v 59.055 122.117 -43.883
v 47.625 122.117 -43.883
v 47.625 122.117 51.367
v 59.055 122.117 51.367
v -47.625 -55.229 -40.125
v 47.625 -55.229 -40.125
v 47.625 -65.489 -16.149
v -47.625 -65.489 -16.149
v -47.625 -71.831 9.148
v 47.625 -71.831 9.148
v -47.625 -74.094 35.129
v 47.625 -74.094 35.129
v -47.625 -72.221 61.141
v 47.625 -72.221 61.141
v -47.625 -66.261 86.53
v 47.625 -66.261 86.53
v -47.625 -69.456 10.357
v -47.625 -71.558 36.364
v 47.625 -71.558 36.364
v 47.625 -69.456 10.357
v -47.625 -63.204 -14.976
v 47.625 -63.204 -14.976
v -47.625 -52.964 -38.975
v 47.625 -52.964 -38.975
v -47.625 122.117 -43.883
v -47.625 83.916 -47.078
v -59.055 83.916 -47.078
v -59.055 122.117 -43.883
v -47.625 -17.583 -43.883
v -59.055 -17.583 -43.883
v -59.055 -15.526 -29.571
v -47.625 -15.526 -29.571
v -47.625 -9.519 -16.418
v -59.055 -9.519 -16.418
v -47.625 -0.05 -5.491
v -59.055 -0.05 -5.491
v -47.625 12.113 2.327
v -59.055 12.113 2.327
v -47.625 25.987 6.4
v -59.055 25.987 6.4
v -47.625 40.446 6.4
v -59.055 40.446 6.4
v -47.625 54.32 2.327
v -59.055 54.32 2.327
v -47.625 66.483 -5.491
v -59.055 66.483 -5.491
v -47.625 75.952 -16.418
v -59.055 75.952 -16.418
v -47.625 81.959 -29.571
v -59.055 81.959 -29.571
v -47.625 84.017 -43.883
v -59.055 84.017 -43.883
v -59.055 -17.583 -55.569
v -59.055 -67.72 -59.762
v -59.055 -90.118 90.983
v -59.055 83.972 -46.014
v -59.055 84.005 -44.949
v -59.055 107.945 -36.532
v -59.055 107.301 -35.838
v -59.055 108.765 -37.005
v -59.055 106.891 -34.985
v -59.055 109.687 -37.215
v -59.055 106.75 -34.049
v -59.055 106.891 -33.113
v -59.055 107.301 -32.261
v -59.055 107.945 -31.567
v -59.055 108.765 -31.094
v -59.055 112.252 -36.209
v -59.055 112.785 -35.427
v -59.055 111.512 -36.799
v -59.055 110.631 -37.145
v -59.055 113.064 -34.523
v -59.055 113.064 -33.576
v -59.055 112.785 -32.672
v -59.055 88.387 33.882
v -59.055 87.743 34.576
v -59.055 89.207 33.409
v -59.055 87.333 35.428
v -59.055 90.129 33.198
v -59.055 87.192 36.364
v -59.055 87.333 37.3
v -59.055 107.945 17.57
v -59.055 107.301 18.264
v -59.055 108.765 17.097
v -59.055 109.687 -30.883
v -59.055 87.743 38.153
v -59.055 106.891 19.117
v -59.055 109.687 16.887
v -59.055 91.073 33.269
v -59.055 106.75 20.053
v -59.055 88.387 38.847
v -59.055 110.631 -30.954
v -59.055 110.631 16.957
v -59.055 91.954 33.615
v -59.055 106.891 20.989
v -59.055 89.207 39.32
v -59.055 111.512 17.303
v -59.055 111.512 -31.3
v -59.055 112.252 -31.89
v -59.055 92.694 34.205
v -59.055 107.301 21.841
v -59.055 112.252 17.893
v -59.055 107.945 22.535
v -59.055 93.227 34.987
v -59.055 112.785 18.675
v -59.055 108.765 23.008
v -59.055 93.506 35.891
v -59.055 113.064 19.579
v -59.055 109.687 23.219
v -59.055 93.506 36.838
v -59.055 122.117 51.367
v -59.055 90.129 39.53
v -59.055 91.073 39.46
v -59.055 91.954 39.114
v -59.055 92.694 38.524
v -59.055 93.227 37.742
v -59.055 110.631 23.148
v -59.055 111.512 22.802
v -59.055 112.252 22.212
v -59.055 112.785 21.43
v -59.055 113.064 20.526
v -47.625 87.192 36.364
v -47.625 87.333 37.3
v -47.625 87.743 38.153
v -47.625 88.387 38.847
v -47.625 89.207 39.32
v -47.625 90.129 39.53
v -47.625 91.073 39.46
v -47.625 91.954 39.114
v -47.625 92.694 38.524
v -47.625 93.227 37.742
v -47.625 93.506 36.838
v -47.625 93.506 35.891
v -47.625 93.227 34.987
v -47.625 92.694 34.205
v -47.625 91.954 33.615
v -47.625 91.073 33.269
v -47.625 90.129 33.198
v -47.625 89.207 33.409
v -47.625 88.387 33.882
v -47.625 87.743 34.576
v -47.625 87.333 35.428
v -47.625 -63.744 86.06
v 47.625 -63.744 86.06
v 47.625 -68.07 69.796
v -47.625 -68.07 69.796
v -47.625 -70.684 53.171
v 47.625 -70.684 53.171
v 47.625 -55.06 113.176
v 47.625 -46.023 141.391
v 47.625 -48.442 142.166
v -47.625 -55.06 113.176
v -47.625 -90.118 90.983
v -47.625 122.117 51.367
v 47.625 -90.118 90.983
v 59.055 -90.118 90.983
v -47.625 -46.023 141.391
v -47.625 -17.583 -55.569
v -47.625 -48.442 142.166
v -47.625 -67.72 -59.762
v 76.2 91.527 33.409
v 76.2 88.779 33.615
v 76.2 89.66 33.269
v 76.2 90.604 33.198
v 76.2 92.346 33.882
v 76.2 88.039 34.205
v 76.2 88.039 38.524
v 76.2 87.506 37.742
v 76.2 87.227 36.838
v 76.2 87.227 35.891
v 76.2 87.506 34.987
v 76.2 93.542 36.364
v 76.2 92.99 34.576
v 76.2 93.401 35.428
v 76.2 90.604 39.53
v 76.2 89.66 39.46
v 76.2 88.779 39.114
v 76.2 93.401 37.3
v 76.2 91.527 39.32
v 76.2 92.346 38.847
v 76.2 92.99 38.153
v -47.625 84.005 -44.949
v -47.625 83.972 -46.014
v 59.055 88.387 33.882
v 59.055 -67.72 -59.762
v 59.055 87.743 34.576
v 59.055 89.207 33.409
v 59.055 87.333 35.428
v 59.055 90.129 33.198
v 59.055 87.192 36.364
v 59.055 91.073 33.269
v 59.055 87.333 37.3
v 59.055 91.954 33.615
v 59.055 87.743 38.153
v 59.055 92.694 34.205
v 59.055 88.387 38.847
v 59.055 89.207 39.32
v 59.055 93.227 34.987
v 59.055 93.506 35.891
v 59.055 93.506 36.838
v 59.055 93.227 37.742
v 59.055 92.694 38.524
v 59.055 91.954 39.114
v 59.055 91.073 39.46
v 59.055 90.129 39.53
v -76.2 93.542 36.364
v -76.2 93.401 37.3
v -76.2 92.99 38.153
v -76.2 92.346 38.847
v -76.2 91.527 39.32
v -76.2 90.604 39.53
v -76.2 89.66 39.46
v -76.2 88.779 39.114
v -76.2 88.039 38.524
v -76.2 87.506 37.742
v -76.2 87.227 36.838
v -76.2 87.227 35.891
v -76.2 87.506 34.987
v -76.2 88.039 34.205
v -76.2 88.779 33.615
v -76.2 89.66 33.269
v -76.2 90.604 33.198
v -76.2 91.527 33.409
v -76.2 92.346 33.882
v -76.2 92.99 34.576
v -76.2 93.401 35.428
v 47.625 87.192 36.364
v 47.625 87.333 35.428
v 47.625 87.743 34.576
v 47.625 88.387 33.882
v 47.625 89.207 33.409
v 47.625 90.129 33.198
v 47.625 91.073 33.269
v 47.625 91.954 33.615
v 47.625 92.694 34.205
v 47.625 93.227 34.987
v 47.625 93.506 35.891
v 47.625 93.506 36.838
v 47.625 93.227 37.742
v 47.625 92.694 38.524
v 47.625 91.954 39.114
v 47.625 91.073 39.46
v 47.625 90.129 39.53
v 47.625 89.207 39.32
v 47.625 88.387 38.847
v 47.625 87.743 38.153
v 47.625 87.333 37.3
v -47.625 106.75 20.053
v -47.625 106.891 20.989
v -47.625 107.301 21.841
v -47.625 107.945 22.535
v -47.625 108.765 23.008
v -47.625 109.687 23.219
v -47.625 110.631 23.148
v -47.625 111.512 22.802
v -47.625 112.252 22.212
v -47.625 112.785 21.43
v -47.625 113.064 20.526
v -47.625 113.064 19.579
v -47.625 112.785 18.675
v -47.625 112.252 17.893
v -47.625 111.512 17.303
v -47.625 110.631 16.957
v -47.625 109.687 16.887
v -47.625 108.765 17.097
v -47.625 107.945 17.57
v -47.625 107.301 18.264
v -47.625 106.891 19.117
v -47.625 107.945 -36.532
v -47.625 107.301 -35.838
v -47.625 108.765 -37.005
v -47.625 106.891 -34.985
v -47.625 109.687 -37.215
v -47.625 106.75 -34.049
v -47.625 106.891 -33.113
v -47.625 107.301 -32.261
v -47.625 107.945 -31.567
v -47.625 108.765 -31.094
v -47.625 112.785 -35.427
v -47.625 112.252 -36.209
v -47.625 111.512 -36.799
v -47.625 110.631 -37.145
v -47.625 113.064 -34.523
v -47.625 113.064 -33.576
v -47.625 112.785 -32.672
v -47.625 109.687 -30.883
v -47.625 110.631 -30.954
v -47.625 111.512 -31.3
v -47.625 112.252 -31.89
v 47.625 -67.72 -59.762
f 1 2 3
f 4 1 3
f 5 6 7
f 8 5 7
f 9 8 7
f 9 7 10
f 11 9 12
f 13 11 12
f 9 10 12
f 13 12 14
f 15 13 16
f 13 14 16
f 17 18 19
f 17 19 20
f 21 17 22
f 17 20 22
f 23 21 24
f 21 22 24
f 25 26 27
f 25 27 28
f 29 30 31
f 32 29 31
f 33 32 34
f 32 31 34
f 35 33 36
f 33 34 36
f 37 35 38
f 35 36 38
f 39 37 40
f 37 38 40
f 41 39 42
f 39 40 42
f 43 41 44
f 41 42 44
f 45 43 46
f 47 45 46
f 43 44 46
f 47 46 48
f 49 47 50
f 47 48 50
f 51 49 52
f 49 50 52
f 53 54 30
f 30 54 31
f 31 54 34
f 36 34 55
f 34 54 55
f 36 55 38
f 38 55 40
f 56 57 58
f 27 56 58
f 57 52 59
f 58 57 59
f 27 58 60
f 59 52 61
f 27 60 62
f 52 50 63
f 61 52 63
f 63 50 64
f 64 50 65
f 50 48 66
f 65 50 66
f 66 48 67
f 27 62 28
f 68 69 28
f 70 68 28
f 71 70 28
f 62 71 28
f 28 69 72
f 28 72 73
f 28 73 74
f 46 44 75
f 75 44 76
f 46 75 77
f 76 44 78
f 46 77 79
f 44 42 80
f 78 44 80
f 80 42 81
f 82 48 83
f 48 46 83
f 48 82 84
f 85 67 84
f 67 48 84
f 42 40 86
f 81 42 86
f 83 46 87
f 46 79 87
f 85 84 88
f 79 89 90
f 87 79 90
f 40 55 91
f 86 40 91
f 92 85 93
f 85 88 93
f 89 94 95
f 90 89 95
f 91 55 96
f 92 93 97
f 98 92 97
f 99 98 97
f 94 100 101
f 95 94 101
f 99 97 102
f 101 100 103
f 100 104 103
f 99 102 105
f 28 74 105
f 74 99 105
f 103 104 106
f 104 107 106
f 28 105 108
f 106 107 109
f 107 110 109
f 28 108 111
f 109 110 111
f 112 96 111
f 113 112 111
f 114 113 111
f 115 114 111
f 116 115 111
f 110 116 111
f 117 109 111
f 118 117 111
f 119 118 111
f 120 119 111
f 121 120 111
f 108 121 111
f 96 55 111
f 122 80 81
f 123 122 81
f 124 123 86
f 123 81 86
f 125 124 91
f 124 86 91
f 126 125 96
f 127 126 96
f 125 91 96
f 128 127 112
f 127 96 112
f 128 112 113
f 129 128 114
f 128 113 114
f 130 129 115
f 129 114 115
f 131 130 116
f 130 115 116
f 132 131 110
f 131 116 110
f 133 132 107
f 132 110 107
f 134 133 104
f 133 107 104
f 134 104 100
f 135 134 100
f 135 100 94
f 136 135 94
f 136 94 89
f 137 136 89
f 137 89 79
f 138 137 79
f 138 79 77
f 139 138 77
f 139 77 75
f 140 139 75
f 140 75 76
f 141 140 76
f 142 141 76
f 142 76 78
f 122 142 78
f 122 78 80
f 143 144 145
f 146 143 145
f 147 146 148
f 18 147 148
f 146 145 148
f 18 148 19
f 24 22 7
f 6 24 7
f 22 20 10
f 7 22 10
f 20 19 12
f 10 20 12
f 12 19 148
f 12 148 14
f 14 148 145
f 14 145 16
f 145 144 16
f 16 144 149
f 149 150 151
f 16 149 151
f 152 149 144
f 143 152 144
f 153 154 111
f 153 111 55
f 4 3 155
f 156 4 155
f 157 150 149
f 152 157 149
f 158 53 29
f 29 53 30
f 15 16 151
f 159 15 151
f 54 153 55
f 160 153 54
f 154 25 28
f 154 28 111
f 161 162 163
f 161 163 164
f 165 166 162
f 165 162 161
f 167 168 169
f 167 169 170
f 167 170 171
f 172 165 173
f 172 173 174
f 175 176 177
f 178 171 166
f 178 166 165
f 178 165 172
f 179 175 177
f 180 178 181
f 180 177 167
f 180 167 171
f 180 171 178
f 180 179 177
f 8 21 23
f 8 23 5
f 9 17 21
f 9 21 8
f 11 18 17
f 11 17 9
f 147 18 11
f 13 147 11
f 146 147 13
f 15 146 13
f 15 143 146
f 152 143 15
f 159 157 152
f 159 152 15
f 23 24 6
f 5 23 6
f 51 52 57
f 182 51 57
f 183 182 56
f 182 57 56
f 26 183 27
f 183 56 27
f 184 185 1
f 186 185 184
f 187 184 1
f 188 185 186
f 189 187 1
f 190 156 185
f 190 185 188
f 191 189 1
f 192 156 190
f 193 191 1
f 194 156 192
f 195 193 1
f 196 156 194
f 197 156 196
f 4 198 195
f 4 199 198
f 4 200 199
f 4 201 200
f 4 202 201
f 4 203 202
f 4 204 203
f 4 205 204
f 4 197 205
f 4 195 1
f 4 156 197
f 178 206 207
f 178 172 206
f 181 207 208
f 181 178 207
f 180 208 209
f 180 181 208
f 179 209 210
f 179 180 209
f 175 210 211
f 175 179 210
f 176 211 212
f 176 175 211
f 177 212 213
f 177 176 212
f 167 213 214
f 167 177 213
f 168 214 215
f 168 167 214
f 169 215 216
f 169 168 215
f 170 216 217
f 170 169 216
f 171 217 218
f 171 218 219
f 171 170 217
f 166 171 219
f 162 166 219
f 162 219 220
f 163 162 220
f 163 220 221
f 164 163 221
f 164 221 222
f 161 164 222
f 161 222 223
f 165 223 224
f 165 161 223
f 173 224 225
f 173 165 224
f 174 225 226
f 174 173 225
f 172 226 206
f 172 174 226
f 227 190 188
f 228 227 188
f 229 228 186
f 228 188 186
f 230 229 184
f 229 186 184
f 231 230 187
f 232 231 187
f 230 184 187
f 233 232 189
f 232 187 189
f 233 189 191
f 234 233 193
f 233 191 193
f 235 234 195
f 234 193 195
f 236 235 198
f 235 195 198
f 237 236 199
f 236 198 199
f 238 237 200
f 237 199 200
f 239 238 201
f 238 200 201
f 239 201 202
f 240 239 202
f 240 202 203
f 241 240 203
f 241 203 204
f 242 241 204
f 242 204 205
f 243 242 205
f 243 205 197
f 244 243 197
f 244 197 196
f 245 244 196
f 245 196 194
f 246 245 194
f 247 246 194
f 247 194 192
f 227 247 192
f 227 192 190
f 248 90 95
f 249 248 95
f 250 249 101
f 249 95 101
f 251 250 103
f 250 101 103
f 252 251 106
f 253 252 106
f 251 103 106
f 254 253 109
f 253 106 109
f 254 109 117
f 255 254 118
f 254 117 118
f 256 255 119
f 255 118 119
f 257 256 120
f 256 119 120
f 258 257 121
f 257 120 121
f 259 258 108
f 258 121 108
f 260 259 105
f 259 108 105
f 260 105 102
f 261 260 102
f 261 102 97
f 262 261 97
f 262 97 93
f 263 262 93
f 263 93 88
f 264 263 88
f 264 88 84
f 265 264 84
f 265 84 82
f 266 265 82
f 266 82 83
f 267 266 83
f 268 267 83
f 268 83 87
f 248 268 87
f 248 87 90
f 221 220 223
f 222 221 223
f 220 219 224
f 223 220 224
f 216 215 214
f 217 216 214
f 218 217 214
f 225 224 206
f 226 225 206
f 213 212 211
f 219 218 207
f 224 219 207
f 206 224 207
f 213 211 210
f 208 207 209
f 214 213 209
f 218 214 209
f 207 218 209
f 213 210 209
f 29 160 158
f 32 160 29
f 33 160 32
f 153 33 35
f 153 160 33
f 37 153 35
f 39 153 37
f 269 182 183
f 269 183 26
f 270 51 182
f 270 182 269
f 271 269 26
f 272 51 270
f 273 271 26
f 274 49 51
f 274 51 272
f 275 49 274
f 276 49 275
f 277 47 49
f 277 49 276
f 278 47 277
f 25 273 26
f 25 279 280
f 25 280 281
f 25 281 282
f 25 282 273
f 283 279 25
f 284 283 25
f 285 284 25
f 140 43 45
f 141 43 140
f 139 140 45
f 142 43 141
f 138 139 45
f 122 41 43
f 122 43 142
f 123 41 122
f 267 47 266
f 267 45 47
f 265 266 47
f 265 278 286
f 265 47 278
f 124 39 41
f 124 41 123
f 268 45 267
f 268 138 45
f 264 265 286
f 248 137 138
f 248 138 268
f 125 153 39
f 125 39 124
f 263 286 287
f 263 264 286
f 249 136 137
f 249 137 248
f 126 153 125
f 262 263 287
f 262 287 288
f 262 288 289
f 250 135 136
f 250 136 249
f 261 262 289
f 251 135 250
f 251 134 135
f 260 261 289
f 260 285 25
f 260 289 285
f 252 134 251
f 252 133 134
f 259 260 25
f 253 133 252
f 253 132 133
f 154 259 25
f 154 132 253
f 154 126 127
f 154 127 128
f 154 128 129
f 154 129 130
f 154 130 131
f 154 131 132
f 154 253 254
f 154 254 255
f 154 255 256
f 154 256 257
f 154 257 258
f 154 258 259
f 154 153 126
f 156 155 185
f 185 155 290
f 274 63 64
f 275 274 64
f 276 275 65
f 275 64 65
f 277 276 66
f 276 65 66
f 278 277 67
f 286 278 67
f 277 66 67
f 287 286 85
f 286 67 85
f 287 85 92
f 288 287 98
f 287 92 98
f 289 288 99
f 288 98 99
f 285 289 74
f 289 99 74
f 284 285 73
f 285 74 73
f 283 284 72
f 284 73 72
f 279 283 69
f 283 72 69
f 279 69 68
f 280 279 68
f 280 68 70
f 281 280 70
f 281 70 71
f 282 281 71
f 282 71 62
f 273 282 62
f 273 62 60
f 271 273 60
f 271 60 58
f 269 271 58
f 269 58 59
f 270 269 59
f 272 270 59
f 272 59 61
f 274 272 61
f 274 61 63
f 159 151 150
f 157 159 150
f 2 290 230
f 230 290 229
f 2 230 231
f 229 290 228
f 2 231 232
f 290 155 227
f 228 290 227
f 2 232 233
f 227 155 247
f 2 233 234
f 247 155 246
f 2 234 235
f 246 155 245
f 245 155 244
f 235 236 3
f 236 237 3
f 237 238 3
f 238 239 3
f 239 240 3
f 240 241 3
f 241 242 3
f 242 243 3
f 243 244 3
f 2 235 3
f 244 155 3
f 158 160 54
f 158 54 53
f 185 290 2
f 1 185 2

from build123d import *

# Parameters (mm, degrees)
F0_R      = 3.175
F1_DEPTH  = 11.43
F5_DEPTH  = 25.4
F6_D      = 6.35
F6_DEPTH  = 76.2
F6_TIP    = 1.9077324654
F7_D      = 6.35
F7_DEPTH  = 76.2
F7_TIP    = 1.9077324654
F8_D      = 6.35
F8_DEPTH  = 76.2
F8_TIP    = 1.9077324654
F9_D      = 6.35
F9_DEPTH  = 76.2
F9_TIP    = 1.9077324654
F11_DEPTH = 95.25
F12_DEPTH = 76.2


with BuildPart() as f1:
    # F0 (on Right) → F1 (new body)
    with BuildSketch(Plane.YZ):
        Polygon((122.1165703362, -43.8827651219), (122.1165703362, 51.3672348781), (-90.1177801321, 90.9827682114), (-67.7204277456, -59.7624426779), align=None)
        with Locations((109.9245703362, -34.0493256675)):
            Circle(F0_R, mode=Mode.SUBTRACT)
        with Locations((109.9245703362, 20.0526743325)):
            Circle(F0_R, mode=Mode.SUBTRACT)
        with Locations((90.3665703362, 36.3643222504)):
            Circle(F0_R, mode=Mode.SUBTRACT)
        with Locations((90.3665703362, 36.3643222504)):
            Circle(F0_R)
        with Locations((109.9245703362, 20.0526743325)):
            Circle(F0_R)
        with Locations((109.9245703362, -34.0493256675)):
            Circle(F0_R)
    extrude(amount=F1_DEPTH)


with BuildPart() as f1_1:
    # F2: moved
    add(f1.part.moved(Location((47.625, 0, 0))))


with BuildPart() as f3_1:
    # F3: instance of F1
    add(f1_1.part.mirror(Plane.YZ))

    # F4 (on face) → F5 (cut)
    with BuildSketch(Plane(origin=(-59.055, 0, 0), x_dir=(0, -1, 0), z_dir=(-1, 0, 0))):
        with BuildLine():
            ThreePointArc((17.5834296638, -43.8827651219), (-33.2165703362, 6.9172348781), (-84.0165703362, -43.8827651219))
            ThreePointArc((-84.0165703362, -43.8827651219), (-83.9914140751, -45.4812779607), (-83.9159702065, -47.0782076259))
            Line((-83.9159702065, -47.0782076259), (16.2473795848, -55.4567729935))
            ThreePointArc((16.2473795848, -55.4567729935), (17.2483117898, -49.7081983252), (17.5834296638, -43.8827651219))
        make_face()
        with BuildLine():
            Line((17.5834296638, -55.5685322642), (17.5834296638, -43.8827651219))
            ThreePointArc((17.5834296638, -43.8827651219), (17.2483117898, -49.7081983252), (16.2473795848, -55.4567729935))
            Line((16.2473795848, -55.4567729935), (17.5834296638, -55.5685322642))
        make_face()
    extrude(amount=-F5_DEPTH, mode=Mode.SUBTRACT)

    # F6
    with Locations(Plane.YZ):
        with Locations((90.3665703362, 36.3643222504)):
            Hole(F6_D / 2, depth=F6_DEPTH)
            with Locations((0, 0, -(F6_DEPTH + F6_TIP / 2))):  # 118° drill point
                Cone(0, F6_D / 2, F6_TIP, mode=Mode.SUBTRACT)

    # F7
    with Locations(Plane.YZ):
        with Locations((109.9245703362, 20.0526743325)):
            Hole(F7_D / 2, depth=F7_DEPTH)
            with Locations((0, 0, -(F7_DEPTH + F7_TIP / 2))):  # 118° drill point
                Cone(0, F7_D / 2, F7_TIP, mode=Mode.SUBTRACT)

    # F8
    with Locations(Plane.YZ):
        with Locations((109.9245703362, -34.0493256675)):
            Hole(F8_D / 2, depth=F8_DEPTH)
            with Locations((0, 0, -(F8_DEPTH + F8_TIP / 2))):  # 118° drill point
                Cone(0, F8_D / 2, F8_TIP, mode=Mode.SUBTRACT)


with BuildPart() as f1_2:
    add(f1_1.part)

    # F9
    with Locations(Plane(origin=(0, 0, 0), x_dir=(0, 1, 0), z_dir=(-1, 0, 0))):
        with Locations((90.3665703362, -36.3643222504)):
            Hole(F9_D / 2, depth=F9_DEPTH)
            with Locations((0, 0, -(F9_DEPTH + F9_TIP / 2))):  # 118° drill point
                Cone(0, F9_D / 2, F9_TIP, mode=Mode.SUBTRACT)


with BuildPart() as f11:
    # F10 (on face) → F11 (new body)
    with BuildSketch(Plane(origin=(47.625, 0, 0), x_dir=(0, -1, 0), z_dir=(-1, 0, 0))):
        with BuildLine():
            Line((46.0226261079, 141.3909337274), (55.0595276774, 113.1756901692))
            ThreePointArc((55.0595276774, 113.1756901692), (61.2467442889, 100.0992346093), (66.2609327925, 86.5296637591))
            Line((66.2609327925, 86.5296637591), (48.4415836851, 142.1656880364))
            Line((48.4415836851, 142.1656880364), (46.0226261079, 141.3909337274))
        make_face()
        with BuildLine():
            Line((55.0595276774, 113.1756901692), (63.7442887749, 86.0599085345))
            Line((63.7442887749, 86.0599085345), (66.2609327925, 86.5296637591))
            ThreePointArc((66.2609327925, 86.5296637591), (61.2467442889, 100.0992346093), (55.0595276774, 113.1756901692))
        make_face()
        with BuildLine():
            Line((63.7442887749, 86.0599085345), (63.7439748969, 86.0598499462))
            ThreePointArc((63.7439748969, 86.0598499462), (69.5928864987, 61.5174094181), (71.5584296638, 36.3643222504))
            ThreePointArc((71.5584296638, 36.3643222504), (66.8411203346, -2.4357759317), (52.9640480804, -38.9751723676))
            Line((52.9640480804, -38.9751723676), (55.2290606215, -40.1252095237))
            ThreePointArc((55.2290606215, -40.1252095237), (69.3114207434, -3.0269888444), (74.0984296638, 36.3643222504))
            ThreePointArc((74.0984296638, 36.3643222504), (72.1272426646, 61.7512669557), (66.2609327925, 86.5296637591))
            Line((66.2609327925, 86.5296637591), (63.7442887749, 86.0599085345))
        make_face()
    extrude(amount=F11_DEPTH)


with BuildPart() as f12:
    # F0 (on Right) → F12 (new body, symmetric)
    with BuildSketch(Plane.YZ):
        with Locations((90.3665703362, 36.3643222504)):
            Circle(F0_R)
    extrude(amount=F12_DEPTH, both=True)


solid = Compound([f3_1.part, f1_2.part, f11.part, f12.part])
